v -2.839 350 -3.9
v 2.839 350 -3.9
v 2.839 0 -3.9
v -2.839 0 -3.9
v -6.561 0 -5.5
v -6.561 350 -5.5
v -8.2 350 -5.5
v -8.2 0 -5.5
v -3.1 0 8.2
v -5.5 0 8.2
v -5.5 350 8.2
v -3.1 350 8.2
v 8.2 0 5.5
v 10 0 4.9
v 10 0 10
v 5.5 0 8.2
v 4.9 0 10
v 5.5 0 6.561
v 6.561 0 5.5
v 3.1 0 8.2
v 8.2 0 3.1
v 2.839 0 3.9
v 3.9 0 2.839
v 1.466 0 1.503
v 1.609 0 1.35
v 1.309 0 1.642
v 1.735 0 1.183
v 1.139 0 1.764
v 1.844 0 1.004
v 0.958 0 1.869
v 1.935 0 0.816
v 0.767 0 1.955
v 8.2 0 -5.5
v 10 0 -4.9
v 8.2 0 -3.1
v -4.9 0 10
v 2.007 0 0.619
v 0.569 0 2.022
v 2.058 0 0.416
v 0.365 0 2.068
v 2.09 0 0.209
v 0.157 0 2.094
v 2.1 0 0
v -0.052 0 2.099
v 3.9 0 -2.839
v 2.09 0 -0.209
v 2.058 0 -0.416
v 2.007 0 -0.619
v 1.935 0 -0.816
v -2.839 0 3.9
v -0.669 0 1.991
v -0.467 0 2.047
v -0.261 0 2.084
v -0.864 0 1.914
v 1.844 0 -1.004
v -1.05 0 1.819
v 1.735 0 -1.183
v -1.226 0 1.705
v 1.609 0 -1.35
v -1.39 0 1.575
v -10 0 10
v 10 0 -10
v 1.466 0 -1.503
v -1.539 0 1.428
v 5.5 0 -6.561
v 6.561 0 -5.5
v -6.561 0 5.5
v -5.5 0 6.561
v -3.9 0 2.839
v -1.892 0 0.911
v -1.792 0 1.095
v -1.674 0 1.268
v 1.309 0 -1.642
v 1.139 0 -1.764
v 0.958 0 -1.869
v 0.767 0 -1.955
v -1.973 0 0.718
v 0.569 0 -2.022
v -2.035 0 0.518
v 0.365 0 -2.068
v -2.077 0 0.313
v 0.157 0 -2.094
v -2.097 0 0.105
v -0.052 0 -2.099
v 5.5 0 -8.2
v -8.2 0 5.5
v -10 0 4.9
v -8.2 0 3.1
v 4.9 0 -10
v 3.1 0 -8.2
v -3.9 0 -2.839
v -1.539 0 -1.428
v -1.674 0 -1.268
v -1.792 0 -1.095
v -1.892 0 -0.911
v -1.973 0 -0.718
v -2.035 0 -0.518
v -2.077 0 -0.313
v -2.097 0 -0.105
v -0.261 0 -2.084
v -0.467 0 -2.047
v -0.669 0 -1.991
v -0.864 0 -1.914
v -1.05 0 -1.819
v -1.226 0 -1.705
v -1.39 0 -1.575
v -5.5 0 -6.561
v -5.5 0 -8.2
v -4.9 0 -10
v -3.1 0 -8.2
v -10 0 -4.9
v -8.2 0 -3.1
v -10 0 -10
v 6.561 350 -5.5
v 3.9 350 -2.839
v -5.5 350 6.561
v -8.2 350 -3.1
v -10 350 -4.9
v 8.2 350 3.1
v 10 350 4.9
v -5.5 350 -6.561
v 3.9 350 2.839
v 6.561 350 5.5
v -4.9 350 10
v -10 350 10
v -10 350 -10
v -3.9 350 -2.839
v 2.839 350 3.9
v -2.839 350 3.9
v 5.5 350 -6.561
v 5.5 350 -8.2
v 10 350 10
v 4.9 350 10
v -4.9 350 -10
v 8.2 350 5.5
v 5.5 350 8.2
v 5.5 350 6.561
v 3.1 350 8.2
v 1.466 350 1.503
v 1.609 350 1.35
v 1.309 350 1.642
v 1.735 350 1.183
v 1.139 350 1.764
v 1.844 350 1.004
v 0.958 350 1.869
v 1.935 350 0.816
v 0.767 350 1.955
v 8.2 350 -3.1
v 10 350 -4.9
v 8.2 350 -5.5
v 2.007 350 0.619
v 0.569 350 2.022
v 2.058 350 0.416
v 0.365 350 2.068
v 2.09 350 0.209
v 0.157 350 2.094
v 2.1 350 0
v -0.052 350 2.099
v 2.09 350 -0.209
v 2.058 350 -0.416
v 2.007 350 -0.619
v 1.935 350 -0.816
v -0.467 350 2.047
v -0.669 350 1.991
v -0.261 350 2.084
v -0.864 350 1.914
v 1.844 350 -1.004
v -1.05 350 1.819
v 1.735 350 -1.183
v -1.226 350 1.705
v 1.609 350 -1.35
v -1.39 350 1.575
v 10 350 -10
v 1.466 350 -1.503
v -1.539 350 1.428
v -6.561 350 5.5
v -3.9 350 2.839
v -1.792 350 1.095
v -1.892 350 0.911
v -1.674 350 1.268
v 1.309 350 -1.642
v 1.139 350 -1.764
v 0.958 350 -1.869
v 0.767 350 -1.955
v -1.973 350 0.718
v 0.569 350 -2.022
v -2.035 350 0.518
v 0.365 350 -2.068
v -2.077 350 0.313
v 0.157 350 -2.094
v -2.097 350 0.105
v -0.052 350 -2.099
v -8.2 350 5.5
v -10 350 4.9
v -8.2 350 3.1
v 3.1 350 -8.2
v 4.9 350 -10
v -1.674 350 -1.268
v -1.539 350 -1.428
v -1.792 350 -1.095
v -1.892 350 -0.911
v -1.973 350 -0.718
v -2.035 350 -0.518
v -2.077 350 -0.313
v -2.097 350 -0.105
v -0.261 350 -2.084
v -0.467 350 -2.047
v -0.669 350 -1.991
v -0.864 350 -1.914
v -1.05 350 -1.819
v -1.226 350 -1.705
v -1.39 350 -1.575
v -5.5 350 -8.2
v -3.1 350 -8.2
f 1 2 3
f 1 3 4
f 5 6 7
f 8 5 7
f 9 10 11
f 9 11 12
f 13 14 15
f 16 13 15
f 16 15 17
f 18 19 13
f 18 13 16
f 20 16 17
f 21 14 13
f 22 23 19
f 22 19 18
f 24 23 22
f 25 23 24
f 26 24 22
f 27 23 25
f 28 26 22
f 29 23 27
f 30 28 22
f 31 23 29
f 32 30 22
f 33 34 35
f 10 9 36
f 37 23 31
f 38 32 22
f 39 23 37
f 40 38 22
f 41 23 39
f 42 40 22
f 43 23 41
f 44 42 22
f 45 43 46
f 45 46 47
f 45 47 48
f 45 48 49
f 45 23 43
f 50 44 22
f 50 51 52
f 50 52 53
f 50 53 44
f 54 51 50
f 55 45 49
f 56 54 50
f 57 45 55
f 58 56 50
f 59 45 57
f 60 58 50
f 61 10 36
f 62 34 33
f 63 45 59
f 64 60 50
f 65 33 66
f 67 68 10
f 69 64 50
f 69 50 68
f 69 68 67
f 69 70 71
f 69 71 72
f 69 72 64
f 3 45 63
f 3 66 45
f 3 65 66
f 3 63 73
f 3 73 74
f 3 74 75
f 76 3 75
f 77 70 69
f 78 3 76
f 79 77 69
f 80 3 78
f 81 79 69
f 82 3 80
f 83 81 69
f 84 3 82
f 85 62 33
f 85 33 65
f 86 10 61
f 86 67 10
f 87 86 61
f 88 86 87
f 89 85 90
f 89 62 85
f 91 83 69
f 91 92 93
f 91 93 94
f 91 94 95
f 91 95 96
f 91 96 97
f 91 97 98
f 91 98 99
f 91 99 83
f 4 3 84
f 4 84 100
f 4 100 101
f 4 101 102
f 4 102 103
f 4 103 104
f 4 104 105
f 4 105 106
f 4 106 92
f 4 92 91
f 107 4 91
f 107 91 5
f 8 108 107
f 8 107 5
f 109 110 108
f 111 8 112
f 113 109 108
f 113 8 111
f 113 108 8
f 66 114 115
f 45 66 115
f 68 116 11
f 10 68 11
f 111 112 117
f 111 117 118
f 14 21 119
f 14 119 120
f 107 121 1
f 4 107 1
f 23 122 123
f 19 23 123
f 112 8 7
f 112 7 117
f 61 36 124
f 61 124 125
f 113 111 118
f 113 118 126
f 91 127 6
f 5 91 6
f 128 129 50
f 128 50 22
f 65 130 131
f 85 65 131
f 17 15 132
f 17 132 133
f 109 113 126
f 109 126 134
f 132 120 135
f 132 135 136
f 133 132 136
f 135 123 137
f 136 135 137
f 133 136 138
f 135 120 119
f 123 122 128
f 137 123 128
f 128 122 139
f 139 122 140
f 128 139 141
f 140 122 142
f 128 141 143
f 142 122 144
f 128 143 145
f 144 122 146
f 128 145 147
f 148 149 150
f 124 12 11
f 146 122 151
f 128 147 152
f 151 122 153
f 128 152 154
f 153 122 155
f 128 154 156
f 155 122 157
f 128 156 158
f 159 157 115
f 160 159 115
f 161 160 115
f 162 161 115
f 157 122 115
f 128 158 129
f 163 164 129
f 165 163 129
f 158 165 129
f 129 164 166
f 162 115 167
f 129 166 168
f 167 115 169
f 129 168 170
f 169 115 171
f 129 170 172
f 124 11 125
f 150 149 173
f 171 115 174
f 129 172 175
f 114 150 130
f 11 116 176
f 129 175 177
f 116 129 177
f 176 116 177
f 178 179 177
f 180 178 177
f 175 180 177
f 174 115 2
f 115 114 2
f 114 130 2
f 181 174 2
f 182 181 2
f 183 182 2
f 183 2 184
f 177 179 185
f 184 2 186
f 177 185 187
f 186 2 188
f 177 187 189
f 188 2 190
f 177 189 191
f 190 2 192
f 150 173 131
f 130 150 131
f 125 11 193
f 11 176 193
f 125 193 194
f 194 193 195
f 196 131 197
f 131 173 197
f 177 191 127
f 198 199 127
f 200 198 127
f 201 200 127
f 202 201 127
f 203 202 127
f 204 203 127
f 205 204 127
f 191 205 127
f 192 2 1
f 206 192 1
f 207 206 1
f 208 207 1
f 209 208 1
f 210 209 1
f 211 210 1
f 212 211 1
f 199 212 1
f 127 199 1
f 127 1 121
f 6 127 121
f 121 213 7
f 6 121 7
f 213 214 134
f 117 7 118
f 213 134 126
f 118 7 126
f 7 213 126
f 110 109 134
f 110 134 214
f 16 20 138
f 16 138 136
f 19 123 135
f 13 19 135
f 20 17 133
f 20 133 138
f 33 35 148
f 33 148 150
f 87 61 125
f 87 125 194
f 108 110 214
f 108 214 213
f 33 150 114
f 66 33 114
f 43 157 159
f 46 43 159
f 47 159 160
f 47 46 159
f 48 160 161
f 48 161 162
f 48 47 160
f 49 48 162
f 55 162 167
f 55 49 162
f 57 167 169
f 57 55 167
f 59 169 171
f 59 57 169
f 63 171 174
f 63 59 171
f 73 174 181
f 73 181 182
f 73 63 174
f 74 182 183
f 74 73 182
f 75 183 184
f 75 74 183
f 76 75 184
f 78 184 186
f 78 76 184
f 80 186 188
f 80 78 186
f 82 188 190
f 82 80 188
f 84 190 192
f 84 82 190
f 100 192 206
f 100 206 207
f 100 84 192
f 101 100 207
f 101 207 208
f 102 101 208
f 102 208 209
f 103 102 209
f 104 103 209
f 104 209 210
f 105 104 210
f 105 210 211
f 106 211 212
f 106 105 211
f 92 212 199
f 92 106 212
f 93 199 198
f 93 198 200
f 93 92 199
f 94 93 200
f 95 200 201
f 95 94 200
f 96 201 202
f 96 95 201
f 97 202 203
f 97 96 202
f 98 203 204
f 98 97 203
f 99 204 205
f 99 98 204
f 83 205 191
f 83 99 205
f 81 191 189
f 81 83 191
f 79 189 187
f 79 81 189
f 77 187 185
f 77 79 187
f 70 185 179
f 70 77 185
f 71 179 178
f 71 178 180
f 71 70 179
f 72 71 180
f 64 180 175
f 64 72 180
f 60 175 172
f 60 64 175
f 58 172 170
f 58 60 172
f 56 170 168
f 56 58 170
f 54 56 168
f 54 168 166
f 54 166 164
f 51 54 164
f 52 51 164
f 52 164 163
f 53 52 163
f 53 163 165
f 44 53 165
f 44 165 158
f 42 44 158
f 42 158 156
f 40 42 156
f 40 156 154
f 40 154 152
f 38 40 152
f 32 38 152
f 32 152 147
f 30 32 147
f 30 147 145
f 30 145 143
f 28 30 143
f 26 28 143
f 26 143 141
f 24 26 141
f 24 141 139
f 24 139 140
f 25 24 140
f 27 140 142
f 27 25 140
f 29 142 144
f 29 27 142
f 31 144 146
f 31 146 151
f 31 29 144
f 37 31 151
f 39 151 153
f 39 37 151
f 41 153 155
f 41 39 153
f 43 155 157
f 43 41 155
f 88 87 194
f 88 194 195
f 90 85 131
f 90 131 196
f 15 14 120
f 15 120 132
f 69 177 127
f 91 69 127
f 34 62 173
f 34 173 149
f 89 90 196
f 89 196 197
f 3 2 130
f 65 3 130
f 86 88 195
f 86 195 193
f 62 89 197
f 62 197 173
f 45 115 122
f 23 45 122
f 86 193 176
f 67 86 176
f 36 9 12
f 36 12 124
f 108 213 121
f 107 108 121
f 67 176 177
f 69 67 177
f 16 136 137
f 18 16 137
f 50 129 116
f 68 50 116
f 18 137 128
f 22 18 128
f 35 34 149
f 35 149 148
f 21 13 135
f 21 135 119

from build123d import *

# Parameters (mm, degrees)
SKETCH_1_R      = 2.1
EXTRUDE_1_DEPTH = 350


with BuildPart() as part:
    # 草图1 → 凸台-拉伸1 (new body)
    with BuildSketch(Plane(origin=(0, 0, 0), x_dir=(1, 0, 0), z_dir=(0, 1, 0))):
        Polygon((-10, 10), (-4.9, 10), (-3.1, 8.2), (-5.5, 8.2), (-5.5, 6.560660172), (-2.839339828, 3.9), (0, 3.9), (2.839339828, 3.9), (5.5, 6.560660172), (5.5, 8.2), (3.1, 8.2), (4.9, 10), (10, 10), (10, 4.9), (8.2, 3.1), (8.2, 5.5), (6.560660172, 5.5), (3.9, 2.839339828), (3.9, -2.839339828), (6.560660172, -5.5), (8.2, -5.5), (8.2, -3.1), (10, -4.9), (10, -10), (4.9, -10), (3.1, -8.2), (5.5, -8.2), (5.5, -6.560660172), (2.839339828, -3.9), (0, -3.9), (-2.839339828, -3.9), (-5.5, -6.560660172), (-5.5, -8.2), (-3.1, -8.2), (-4.9, -10), (-10, -10), (-10, -4.9), (-8.2, -3.1), (-8.2, -5.5), (-6.560660172, -5.5), (-3.9, -2.839339828), (-3.9, 2.839339828), (-6.560660172, 5.5), (-8.2, 5.5), (-8.2, 3.1), (-10, 4.9), align=None)
        Circle(SKETCH_1_R, mode=Mode.SUBTRACT)
    extrude(amount=EXTRUDE_1_DEPTH)


solid = part.part
